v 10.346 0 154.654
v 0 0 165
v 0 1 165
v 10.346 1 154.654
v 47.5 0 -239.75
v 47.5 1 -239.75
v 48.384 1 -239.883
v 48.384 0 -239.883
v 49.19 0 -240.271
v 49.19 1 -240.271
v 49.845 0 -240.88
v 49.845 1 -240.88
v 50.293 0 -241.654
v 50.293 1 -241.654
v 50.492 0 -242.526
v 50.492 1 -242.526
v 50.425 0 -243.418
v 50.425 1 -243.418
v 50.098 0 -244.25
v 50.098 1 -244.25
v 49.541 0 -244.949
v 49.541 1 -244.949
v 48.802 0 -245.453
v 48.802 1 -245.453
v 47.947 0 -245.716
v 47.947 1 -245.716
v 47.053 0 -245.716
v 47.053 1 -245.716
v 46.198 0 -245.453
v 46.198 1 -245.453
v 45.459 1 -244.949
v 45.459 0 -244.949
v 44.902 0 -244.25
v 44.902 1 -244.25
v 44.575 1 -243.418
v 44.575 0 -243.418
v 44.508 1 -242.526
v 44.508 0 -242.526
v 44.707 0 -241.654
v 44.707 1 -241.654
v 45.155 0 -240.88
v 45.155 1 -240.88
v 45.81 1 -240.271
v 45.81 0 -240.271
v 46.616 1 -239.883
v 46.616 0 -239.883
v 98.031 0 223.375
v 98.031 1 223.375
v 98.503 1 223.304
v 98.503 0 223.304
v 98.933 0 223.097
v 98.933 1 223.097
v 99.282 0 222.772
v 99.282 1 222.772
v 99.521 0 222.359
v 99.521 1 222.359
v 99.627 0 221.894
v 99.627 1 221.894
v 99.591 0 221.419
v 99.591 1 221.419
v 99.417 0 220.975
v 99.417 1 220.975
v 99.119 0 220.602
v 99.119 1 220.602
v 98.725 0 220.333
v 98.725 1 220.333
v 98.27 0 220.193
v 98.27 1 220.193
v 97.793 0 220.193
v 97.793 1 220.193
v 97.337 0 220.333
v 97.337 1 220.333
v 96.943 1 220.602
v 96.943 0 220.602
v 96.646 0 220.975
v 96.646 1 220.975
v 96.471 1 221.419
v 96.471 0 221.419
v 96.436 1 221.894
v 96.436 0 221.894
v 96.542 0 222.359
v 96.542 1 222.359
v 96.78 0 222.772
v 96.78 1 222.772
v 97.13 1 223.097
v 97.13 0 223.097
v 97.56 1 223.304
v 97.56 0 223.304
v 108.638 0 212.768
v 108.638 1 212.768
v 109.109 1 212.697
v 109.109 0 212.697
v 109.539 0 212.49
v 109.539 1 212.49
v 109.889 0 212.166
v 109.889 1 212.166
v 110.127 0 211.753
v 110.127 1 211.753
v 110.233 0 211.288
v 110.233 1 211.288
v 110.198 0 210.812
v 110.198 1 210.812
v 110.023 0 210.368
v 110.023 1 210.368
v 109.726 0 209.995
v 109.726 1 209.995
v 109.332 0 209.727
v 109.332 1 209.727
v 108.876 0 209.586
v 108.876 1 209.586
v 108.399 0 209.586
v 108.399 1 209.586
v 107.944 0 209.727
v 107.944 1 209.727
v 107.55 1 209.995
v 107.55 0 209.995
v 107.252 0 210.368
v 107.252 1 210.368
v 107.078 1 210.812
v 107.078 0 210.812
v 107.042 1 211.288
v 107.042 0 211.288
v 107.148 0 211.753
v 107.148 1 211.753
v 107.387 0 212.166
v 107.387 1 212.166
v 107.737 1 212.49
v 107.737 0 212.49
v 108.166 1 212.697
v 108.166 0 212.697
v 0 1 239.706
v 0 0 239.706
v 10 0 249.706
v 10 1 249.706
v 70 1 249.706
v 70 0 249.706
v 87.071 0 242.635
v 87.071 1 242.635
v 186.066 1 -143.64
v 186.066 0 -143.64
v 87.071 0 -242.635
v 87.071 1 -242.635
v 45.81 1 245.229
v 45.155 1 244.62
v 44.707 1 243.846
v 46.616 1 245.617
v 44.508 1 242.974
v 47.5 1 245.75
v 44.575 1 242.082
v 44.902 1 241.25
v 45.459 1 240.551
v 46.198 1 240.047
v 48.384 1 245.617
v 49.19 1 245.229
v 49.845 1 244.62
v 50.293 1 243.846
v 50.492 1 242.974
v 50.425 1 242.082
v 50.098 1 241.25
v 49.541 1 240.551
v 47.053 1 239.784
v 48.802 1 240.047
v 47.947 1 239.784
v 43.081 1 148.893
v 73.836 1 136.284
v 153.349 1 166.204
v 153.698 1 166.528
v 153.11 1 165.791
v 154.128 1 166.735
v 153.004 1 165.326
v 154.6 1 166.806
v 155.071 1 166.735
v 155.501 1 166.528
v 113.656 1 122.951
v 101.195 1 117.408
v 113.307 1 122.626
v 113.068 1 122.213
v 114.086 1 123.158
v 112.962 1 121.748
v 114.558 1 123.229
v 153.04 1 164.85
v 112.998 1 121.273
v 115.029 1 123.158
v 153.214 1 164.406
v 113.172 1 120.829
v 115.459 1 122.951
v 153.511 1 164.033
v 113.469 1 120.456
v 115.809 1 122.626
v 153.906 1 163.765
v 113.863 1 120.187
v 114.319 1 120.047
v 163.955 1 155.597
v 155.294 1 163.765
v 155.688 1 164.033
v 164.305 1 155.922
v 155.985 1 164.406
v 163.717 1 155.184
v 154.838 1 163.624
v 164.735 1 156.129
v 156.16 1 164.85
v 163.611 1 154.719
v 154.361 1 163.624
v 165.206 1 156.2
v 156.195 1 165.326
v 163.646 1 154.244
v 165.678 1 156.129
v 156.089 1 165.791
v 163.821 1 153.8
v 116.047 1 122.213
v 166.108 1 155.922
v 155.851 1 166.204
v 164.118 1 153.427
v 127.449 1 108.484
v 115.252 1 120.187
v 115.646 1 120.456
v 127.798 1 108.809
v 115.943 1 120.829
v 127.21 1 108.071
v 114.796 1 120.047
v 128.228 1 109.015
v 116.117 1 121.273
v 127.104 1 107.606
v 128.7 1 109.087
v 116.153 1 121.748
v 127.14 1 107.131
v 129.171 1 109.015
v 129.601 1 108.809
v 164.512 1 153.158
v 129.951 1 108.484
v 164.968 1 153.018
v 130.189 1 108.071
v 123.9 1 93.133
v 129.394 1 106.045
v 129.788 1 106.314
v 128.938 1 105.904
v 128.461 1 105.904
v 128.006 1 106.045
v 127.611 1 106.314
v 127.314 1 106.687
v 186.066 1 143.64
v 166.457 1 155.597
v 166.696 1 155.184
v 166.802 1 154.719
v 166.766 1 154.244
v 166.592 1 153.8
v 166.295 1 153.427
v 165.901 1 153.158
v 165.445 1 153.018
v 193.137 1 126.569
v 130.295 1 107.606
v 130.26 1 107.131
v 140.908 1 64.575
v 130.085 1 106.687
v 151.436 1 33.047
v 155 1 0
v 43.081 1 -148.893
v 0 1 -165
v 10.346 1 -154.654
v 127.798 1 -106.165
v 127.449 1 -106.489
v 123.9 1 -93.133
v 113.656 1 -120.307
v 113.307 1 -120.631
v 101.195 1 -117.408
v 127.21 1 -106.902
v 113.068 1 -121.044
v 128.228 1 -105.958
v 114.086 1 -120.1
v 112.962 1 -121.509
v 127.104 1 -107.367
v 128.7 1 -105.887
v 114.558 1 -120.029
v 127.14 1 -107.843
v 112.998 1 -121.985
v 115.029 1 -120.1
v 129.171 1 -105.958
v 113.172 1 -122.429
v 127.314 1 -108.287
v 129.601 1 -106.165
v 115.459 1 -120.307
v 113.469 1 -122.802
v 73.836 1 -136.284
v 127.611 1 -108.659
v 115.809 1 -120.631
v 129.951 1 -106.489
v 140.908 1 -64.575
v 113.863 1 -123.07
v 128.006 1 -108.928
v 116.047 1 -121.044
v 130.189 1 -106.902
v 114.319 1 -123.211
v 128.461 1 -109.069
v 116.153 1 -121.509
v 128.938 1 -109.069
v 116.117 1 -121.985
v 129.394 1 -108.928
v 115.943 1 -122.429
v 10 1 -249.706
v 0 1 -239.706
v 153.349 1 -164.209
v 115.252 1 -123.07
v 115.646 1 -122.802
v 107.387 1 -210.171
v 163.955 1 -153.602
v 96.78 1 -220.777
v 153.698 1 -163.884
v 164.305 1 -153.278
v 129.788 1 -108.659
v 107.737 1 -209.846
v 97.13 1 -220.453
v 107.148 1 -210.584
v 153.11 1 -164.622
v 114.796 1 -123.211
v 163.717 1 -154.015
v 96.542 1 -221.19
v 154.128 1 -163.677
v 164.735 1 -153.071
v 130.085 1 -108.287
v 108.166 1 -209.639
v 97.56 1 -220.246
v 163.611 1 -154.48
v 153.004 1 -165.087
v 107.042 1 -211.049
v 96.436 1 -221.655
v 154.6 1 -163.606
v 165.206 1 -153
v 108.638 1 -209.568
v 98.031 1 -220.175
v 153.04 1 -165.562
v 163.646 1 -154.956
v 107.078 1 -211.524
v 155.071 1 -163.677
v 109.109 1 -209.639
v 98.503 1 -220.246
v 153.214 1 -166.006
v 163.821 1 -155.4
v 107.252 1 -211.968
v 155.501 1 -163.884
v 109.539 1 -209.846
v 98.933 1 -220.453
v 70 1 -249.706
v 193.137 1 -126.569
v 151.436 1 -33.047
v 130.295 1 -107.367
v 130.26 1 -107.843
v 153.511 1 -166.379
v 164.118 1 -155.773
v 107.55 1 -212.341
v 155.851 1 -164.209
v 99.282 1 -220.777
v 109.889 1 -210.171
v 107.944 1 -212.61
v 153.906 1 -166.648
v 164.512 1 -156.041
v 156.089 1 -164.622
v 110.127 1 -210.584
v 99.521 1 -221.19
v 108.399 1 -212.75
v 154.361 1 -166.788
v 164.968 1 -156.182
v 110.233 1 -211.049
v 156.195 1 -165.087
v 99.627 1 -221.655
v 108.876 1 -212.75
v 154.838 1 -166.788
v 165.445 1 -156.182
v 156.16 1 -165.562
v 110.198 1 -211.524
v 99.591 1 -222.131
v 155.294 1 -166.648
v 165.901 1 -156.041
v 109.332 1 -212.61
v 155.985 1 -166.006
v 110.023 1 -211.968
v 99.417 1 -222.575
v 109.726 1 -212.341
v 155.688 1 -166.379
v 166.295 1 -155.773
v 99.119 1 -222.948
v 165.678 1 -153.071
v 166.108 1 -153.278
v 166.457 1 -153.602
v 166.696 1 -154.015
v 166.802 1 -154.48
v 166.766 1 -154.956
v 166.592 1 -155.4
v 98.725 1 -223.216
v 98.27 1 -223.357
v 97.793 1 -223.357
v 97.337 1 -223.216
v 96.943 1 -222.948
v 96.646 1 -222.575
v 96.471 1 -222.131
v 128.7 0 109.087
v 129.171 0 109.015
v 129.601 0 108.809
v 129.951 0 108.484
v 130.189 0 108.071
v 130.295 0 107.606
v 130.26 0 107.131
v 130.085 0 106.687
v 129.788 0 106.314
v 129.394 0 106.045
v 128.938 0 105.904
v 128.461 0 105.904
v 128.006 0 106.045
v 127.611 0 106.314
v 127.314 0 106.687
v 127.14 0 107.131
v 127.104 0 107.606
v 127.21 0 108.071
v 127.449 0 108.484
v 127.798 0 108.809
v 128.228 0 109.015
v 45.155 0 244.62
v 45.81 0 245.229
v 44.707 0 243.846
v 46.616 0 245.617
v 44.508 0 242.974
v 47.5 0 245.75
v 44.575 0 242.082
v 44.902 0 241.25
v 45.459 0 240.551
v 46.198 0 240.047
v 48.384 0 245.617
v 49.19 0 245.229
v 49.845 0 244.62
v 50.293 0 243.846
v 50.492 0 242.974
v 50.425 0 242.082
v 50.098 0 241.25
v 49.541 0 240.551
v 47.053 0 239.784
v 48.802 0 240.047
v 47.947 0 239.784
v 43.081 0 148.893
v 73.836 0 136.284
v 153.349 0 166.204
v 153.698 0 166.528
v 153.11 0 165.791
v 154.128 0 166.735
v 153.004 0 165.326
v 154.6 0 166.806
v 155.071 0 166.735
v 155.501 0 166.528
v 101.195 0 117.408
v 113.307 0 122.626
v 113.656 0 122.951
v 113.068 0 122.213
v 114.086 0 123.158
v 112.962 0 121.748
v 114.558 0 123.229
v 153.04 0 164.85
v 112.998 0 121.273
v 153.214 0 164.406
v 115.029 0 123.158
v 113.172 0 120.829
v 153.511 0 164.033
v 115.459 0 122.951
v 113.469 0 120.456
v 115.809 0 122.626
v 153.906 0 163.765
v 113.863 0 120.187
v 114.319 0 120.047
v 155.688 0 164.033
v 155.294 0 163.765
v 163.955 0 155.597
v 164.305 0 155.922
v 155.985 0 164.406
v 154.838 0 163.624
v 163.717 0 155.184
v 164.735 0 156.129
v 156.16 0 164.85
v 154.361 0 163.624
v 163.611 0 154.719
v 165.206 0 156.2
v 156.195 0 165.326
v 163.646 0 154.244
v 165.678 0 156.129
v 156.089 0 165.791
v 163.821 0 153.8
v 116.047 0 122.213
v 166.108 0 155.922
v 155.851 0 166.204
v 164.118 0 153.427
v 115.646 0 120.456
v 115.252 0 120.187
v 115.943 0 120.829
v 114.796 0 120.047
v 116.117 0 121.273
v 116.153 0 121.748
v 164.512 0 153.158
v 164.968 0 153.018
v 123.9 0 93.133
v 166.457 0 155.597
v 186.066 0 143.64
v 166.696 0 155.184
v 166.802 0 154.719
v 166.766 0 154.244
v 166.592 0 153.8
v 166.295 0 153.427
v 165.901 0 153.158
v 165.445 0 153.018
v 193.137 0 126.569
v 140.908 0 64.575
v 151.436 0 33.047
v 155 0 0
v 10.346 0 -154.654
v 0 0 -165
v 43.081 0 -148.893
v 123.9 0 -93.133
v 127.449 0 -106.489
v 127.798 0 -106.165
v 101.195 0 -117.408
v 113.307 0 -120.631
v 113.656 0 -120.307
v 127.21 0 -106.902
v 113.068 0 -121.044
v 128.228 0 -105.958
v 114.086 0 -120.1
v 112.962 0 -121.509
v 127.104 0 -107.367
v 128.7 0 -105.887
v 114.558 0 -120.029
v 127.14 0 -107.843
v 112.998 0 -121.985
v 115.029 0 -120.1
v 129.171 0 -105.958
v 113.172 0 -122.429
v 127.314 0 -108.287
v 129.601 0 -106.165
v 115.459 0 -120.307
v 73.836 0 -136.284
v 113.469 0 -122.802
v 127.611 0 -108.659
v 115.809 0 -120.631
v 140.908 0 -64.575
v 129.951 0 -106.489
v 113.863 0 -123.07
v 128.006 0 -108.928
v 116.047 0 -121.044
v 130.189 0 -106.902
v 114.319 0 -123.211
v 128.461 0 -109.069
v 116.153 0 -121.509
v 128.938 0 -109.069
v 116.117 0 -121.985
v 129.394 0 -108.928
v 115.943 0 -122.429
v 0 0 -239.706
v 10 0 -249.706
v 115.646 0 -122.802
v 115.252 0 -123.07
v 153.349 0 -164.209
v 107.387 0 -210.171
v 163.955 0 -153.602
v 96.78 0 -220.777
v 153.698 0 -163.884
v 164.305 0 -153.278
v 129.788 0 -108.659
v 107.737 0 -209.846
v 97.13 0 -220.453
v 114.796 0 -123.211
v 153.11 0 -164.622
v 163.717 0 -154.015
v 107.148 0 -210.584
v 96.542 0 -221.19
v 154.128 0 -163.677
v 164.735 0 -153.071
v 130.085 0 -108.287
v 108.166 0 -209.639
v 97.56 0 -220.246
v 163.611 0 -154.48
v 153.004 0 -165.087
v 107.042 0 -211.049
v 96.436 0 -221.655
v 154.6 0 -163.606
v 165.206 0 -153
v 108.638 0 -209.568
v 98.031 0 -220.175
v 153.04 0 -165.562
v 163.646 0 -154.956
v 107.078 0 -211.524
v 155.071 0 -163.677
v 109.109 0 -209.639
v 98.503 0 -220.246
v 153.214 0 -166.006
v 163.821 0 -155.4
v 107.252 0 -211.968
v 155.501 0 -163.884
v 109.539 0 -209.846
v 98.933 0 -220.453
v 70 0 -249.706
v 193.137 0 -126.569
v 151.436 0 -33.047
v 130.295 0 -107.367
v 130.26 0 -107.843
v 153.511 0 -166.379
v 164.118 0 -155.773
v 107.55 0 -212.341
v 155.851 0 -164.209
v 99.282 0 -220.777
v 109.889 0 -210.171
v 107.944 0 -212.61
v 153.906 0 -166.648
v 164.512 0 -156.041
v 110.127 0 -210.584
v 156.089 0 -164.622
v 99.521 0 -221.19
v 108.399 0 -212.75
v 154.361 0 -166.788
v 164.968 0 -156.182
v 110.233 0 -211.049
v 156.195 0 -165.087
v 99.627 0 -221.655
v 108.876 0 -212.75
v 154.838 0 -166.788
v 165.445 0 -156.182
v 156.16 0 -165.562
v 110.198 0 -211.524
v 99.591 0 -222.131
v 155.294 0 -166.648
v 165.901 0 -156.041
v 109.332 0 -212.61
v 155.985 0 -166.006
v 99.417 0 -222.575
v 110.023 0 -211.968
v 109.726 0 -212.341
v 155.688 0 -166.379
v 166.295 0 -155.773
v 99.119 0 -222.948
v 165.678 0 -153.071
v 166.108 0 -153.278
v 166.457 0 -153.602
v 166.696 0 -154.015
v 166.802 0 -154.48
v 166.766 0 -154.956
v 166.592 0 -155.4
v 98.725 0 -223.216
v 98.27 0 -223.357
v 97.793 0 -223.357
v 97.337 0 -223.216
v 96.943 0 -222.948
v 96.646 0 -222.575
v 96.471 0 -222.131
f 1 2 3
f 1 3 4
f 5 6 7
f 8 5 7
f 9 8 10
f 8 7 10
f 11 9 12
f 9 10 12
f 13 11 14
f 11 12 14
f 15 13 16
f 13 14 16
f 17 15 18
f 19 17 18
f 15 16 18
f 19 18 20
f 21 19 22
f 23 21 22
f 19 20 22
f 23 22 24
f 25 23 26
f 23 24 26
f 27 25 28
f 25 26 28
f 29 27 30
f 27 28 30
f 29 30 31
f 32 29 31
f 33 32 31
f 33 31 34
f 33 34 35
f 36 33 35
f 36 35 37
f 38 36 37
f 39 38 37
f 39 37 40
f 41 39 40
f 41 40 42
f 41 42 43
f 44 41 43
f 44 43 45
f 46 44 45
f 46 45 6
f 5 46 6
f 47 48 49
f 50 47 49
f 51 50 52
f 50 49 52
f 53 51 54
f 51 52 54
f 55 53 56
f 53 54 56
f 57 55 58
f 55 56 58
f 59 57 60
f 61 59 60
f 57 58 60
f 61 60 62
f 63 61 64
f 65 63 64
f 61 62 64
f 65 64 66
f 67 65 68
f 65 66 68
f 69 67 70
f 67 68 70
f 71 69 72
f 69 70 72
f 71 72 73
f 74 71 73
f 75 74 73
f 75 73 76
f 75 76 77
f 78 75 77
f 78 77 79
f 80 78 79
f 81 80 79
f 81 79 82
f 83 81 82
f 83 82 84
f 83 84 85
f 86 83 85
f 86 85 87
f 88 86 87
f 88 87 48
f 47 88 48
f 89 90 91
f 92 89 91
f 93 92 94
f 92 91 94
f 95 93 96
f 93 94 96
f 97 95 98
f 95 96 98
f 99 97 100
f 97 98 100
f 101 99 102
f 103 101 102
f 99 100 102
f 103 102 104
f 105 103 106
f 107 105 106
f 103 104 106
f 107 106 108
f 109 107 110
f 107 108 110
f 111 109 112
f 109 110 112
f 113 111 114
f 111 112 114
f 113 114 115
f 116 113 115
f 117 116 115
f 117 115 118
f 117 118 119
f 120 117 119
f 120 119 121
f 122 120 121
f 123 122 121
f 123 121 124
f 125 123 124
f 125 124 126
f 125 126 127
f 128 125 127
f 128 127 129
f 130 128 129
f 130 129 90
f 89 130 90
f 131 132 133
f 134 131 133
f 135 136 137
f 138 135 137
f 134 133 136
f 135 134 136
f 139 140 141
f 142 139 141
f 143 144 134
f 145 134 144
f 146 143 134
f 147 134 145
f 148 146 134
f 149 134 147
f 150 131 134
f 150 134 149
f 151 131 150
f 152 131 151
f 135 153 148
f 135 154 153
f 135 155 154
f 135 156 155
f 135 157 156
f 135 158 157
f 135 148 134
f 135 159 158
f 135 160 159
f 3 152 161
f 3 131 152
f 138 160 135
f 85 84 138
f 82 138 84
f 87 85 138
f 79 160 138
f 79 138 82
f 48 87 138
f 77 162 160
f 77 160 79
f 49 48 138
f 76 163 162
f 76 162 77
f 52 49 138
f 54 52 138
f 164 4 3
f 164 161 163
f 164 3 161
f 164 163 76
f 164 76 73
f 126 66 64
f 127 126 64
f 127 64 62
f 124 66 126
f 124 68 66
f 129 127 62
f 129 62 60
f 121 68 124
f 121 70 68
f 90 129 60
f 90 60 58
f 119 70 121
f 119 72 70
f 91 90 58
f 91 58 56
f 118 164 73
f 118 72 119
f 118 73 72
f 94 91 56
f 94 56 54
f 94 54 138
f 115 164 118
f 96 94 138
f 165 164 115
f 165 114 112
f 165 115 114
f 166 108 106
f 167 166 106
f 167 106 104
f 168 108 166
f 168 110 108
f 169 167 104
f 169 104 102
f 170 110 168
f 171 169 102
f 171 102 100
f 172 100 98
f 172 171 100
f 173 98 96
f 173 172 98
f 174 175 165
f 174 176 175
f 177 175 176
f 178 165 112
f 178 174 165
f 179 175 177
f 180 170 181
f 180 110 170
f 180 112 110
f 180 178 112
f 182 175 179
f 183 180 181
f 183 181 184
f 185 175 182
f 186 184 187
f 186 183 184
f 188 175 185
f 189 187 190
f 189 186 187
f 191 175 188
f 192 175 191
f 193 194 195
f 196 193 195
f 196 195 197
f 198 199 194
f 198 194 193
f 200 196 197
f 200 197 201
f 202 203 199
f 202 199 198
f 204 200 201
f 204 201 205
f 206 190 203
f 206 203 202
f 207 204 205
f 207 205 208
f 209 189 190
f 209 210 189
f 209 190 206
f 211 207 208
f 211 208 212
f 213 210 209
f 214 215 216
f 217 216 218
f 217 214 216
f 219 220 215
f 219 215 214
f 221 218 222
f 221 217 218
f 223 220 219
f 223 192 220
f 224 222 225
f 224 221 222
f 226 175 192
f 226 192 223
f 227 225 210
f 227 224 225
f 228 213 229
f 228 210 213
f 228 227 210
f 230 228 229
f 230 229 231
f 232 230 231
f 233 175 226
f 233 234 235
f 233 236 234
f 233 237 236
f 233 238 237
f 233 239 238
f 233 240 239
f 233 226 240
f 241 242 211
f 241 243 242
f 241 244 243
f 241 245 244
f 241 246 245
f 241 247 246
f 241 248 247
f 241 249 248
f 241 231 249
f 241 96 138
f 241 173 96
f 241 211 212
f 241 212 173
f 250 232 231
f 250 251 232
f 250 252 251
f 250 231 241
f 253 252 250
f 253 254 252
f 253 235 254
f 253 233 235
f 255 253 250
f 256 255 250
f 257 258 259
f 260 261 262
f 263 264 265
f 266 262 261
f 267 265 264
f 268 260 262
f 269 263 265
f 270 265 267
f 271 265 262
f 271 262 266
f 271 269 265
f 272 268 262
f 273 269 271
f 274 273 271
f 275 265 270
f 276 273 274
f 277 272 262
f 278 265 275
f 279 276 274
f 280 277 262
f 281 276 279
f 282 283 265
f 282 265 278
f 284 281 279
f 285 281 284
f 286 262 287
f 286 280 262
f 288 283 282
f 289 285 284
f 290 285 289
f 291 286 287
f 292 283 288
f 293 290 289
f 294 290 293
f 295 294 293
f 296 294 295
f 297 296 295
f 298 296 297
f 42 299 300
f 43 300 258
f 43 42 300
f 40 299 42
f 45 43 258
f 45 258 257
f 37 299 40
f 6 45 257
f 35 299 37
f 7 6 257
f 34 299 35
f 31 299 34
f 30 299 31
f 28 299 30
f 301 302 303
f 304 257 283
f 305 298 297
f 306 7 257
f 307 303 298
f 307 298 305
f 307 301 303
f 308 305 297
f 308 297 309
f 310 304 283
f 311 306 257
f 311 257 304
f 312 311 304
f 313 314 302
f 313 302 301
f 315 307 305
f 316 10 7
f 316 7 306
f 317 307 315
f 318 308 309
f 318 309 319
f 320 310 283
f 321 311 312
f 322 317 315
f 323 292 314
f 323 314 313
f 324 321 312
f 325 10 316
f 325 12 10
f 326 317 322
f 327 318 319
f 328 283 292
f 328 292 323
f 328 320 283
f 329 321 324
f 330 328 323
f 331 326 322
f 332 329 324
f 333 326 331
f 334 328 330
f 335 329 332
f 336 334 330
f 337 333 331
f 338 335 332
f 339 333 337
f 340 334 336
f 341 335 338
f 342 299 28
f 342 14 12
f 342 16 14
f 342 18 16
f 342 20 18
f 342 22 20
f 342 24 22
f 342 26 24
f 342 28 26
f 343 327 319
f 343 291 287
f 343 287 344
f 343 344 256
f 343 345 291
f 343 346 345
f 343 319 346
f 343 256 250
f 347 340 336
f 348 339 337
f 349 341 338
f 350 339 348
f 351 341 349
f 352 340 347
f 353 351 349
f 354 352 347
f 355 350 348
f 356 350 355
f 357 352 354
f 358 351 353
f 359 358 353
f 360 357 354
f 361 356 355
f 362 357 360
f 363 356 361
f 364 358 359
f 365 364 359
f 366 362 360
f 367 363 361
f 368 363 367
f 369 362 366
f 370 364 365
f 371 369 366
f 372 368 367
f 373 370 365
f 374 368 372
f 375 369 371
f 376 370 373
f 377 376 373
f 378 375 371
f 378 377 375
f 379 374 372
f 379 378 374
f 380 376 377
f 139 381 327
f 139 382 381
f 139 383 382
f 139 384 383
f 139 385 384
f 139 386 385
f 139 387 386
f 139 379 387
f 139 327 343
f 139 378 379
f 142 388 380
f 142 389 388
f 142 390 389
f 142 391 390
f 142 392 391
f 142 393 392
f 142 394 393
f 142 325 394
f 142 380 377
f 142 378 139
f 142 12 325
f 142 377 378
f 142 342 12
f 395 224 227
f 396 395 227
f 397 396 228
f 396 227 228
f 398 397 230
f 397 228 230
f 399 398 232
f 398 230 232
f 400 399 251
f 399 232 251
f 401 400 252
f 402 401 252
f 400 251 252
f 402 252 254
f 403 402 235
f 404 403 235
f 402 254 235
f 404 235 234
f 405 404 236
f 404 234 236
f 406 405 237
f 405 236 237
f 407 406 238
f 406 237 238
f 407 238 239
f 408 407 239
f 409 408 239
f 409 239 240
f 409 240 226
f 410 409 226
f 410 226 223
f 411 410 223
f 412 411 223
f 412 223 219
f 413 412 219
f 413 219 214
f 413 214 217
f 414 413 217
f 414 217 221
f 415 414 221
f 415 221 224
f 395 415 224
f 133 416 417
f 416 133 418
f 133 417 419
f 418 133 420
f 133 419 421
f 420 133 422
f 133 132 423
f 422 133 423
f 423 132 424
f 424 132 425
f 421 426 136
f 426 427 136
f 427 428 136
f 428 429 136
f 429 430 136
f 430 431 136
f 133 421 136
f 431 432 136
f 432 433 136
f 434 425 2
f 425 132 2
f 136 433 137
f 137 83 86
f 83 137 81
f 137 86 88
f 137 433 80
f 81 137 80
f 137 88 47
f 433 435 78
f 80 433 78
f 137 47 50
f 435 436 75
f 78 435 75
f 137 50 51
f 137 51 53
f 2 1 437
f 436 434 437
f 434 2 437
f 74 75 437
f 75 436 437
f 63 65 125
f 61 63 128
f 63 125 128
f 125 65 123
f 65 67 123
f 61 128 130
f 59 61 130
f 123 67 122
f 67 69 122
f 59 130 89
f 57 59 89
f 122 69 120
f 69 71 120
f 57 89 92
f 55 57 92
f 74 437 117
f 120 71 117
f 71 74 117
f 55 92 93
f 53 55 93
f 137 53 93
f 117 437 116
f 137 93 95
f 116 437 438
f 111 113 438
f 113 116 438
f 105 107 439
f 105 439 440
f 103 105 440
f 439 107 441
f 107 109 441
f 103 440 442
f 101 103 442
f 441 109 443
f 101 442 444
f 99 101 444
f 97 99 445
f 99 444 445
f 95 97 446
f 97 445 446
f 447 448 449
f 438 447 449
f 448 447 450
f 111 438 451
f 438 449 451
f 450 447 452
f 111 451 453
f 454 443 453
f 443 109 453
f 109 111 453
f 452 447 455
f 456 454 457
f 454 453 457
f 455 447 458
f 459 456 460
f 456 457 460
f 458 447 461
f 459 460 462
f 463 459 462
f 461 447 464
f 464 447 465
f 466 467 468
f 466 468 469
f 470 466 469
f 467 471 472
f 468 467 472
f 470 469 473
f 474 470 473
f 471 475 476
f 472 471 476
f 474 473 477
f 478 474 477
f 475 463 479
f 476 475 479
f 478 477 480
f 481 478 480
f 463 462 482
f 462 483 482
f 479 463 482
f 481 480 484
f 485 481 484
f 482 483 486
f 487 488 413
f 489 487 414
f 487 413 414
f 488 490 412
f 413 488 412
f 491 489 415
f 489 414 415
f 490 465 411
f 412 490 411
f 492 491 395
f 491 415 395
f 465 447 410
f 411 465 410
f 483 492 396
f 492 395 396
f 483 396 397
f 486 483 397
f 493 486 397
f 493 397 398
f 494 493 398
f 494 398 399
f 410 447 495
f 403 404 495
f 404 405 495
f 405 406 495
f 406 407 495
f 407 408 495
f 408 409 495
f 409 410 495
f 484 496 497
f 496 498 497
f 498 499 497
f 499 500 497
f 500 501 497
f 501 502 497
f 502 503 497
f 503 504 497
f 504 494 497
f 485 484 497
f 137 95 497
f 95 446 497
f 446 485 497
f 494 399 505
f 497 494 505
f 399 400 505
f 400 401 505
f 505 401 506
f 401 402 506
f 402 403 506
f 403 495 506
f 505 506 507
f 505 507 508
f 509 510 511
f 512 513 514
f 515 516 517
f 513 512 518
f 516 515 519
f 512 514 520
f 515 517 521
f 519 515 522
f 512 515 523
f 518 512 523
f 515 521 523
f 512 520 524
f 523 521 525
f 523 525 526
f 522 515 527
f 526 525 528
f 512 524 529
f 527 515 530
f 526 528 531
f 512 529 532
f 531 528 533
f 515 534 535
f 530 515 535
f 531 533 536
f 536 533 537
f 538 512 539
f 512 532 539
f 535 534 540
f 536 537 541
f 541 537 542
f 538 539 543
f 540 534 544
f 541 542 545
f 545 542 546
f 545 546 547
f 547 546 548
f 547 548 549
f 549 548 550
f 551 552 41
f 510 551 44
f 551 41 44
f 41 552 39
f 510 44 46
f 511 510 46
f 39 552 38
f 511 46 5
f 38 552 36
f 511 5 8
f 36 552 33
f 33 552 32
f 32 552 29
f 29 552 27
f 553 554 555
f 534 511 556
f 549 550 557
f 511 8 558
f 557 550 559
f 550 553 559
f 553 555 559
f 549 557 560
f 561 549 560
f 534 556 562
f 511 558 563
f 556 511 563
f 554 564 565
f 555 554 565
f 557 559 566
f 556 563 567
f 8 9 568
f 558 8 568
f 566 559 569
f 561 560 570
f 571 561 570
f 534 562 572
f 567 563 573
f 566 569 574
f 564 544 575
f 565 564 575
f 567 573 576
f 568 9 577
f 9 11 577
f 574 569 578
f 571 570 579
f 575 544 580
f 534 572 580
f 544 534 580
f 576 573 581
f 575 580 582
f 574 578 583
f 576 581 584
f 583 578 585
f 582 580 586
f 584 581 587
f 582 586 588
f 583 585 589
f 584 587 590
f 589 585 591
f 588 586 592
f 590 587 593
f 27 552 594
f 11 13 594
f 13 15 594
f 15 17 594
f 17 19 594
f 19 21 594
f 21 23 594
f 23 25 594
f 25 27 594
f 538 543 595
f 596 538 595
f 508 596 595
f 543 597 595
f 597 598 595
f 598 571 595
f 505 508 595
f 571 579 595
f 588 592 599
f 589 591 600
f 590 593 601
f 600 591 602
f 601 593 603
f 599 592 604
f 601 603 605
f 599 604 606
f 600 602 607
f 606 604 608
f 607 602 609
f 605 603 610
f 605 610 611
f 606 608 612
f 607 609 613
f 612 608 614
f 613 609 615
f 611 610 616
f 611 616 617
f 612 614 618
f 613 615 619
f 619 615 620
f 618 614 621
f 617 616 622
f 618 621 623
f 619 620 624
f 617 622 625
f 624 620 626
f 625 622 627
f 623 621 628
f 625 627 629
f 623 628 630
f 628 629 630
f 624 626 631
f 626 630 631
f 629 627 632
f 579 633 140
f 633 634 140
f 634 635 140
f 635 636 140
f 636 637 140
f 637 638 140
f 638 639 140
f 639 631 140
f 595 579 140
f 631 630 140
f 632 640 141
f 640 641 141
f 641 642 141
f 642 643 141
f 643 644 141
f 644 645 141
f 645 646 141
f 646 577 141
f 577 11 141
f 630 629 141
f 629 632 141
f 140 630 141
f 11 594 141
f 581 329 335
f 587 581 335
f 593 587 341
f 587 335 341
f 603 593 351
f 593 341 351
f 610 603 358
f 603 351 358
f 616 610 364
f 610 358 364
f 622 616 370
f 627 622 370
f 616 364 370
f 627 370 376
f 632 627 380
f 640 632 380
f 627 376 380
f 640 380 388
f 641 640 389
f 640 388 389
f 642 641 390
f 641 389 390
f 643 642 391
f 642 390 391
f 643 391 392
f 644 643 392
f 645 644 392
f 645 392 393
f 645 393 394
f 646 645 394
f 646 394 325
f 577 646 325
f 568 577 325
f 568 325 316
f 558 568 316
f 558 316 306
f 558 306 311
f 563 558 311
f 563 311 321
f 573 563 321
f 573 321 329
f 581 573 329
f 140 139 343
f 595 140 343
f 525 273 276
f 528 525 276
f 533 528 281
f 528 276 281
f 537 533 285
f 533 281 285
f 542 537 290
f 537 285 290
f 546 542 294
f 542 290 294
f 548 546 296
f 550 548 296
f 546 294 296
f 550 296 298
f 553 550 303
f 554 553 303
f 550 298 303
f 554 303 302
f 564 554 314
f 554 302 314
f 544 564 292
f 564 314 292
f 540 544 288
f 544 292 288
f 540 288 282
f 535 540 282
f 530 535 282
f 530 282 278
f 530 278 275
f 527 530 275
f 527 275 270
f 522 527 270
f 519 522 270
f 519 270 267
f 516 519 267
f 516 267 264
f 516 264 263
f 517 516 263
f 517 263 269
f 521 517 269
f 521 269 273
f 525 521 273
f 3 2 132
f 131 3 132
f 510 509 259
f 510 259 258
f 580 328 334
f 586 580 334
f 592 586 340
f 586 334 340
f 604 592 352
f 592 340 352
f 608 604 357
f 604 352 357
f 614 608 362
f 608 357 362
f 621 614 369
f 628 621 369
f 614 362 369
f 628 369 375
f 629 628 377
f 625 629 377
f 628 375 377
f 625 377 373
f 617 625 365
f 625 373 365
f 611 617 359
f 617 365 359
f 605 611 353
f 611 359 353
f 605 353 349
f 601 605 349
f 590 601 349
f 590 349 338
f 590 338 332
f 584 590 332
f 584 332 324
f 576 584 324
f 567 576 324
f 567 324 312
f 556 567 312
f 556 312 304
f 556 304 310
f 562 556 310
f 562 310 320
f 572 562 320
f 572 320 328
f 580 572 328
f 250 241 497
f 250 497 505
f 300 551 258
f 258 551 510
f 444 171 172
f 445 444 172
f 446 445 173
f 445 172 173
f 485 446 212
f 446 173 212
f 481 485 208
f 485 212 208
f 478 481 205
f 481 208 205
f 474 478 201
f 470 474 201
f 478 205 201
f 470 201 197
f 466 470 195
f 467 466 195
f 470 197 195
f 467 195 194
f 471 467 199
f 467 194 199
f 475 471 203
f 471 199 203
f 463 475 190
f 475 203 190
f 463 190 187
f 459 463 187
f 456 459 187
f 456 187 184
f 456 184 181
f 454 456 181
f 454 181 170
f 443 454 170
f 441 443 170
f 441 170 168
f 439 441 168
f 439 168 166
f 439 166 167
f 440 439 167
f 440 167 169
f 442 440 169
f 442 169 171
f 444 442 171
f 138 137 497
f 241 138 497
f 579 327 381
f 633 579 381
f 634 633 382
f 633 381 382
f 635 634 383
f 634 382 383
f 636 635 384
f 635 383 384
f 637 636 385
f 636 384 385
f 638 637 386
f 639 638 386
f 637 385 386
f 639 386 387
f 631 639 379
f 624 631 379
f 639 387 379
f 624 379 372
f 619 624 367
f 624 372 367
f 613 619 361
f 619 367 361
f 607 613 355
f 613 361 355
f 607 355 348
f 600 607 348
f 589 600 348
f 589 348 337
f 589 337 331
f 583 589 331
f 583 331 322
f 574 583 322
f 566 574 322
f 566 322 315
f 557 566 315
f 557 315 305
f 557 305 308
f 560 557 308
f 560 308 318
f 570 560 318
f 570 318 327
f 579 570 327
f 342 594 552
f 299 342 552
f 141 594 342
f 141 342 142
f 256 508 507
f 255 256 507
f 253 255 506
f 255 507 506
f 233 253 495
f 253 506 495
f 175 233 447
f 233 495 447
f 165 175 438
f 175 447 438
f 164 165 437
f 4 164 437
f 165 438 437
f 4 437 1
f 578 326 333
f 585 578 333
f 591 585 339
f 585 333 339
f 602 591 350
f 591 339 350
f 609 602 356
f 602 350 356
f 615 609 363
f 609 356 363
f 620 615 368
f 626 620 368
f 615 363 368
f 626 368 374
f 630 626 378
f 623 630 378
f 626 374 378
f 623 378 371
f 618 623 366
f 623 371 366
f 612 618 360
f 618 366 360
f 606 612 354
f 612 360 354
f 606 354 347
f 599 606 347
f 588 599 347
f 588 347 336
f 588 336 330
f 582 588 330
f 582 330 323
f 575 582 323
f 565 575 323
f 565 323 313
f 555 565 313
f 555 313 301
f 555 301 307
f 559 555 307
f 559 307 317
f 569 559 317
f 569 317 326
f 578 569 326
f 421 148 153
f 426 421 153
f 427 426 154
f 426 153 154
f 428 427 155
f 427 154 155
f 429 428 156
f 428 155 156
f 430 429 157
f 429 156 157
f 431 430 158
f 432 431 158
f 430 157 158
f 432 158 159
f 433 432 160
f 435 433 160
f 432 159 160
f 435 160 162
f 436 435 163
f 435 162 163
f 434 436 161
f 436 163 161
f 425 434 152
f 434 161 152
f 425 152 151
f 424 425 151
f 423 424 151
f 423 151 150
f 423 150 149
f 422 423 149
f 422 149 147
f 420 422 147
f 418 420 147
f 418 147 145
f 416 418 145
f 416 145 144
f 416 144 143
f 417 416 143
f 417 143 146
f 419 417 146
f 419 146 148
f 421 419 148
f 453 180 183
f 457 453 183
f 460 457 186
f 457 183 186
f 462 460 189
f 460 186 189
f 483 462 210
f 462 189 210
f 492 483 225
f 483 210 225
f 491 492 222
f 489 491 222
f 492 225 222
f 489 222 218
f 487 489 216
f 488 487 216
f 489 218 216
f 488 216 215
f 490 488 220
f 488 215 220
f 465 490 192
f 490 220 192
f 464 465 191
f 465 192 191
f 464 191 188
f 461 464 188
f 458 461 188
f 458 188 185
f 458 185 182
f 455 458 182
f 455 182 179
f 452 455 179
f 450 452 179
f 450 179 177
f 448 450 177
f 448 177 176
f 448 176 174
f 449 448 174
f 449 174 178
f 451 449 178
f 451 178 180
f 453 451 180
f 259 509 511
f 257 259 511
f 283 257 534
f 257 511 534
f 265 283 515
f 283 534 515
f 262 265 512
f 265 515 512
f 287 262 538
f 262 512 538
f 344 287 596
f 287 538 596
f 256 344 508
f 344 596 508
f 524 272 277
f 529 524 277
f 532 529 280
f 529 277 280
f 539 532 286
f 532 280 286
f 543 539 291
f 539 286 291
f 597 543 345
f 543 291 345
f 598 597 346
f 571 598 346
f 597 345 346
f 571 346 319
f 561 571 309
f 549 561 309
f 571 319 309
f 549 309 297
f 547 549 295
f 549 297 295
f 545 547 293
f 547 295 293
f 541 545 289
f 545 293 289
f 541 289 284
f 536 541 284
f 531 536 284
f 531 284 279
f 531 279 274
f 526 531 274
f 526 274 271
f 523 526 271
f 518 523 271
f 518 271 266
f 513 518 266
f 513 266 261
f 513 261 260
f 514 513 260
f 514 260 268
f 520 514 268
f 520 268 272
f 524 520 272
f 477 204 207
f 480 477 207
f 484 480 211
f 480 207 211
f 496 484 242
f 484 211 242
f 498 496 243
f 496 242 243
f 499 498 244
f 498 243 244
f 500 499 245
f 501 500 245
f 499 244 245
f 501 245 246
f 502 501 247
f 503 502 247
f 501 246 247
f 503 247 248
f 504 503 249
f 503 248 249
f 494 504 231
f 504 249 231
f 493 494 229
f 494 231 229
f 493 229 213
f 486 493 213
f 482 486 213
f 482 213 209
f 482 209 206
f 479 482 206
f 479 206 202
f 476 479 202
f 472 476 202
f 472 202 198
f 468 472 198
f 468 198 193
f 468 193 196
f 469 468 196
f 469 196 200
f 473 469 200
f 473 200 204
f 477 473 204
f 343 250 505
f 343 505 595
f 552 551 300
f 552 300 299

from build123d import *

# Parameters (mm, degrees)
EXTRUDE_1_DEPTH     = 1
SKETCH_4_W          = 56.568542495
SKETCH_4_H          = 273.13708499
CUT_EXTRUDE_3_DEPTH = 354.138500868
CHAMFER_1_SIZE      = 10
SKETCH_5_R          = 1.6
CUT_EXTRUDE_4_DEPTH = 10
SKETCH_6_R          = 3
CUT_EXTRUDE_5_DEPTH = 10
SKETCH_7_R          = 1.6
CUT_EXTRUDE_6_DEPTH = 4


with BuildPart() as part:
    # 草图1 → 凸台-拉伸1 (new body)
    with BuildSketch(Plane(origin=(0, 0, 0), x_dir=(1, 0, 0), z_dir=(0, 1, 0))):
        with BuildLine():
            Line((0, 249.705627485), (0, 155))
            ThreePointArc((0, 155), (109.601551084, 109.601551084), (155, 0))
            ThreePointArc((155, 0), (109.601551084, -109.601551084), (0, -155))
            Line((0, -155), (0, -249.705627485))
            Line((0, -249.705627485), (80, -249.705627485))
            Line((80, -249.705627485), (249.705627485, -80))
            Line((249.705627485, -80), (249.705627485, 0))
            Line((249.705627485, 0), (249.705627485, 80))
            Line((249.705627485, 80), (80, 249.705627485))
            Line((80, 249.705627485), (0, 249.705627485))
        make_face()
    extrude(amount=EXTRUDE_1_DEPTH)

    # 草图4 → 切除-拉伸3 (cut, through all)
    with BuildSketch(Plane(origin=(0, 1, 0), x_dir=(1, 0, 0), z_dir=(0, 1, 0))):
        with Locations((221.421356237, 0)):
            Rectangle(SKETCH_4_W, SKETCH_4_H)
    extrude(amount=-CUT_EXTRUDE_3_DEPTH, mode=Mode.SUBTRACT)

    # 倒角1
    # the kernel refuses this chamfer: 10 mm, written as the material it takes off along each edge
    with BuildSketch(Plane(origin=(0, -26.617651024, -155), x_dir=(0.9994423420060535, 0, 0.0333916906648138), z_dir=(0, 1, 0))) as chamfer_1_piece_1:
        with BuildLine():
            Line((10.351424106, 0), (-CHAMFER_1_SIZE * 0.0333916906648, CHAMFER_1_SIZE * 0.999442342006))
            Line((-CHAMFER_1_SIZE * 0.0333916906648, CHAMFER_1_SIZE * 0.999442342006), (0, 0))
            ThreePointArc((0, 0), (5.321987279, 0.086367968), (10.351424106, 0))
        make_face()
    extrude(amount=54.235302047, mode=Mode.SUBTRACT)
    with BuildSketch(Plane(origin=(0, -25.71682988, -249.705627485), x_dir=(0, 0, 1), z_dir=(0, 1, 0))) as chamfer_1_piece_2:
        Polygon((CHAMFER_1_SIZE, 0), (0, CHAMFER_1_SIZE), (0, 0), align=None)
    extrude(amount=52.433659759, mode=Mode.SUBTRACT)
    with BuildSketch(Plane(origin=(80, -25.926703929, -249.705627485), x_dir=(-1, 0, 0), z_dir=(0, 1, 0)), Plane(origin=(193.13708499, 26.926703929, 136.568542495), x_dir=(-0.7071067811865447, 0, 0.7071067811865503), z_dir=(0, -1, 0))) as chamfer_1_piece_3:
        Polygon((CHAMFER_1_SIZE, 0), (-CHAMFER_1_SIZE * 0.707106781187, CHAMFER_1_SIZE * 0.707106781187), (0, 0), align=None)
    extrude(amount=52.853407858, mode=Mode.SUBTRACT)
    with BuildSketch(Plane(origin=(80, -25.926703929, 249.705627485), x_dir=(-1, 0, 0), z_dir=(0, 1, 0)), Plane(origin=(193.13708499, 26.926703929, -136.568542495), x_dir=(-0.7071067811865476, 0, -0.7071067811865476), z_dir=(0, -1, 0))) as chamfer_1_piece_4:
        Polygon((CHAMFER_1_SIZE, 0), (-CHAMFER_1_SIZE * 0.707106781187, -CHAMFER_1_SIZE * 0.707106781187), (0, 0), align=None)
    extrude(amount=52.853407858, mode=Mode.SUBTRACT)
    with BuildSketch(Plane(origin=(0, -25.71682988, 249.705627485), x_dir=(0, 0, -1), z_dir=(0, 1, 0))) as chamfer_1_piece_5:
        Polygon((CHAMFER_1_SIZE, 0), (0, -CHAMFER_1_SIZE), (0, 0), align=None)
    extrude(amount=52.433659759, mode=Mode.SUBTRACT)
    with BuildSketch(Plane(origin=(0, -26.617651024, 155), x_dir=(0, 0, 1), z_dir=(0, 1, 0))) as chamfer_1_piece_6:
        with BuildLine():
            Line((CHAMFER_1_SIZE, 0), (-0.345651552, 10.345651552))
            ThreePointArc((-0.345651552, 10.345651552), (-0.091390348, 5.321903403), (0, 0))
            Line((0, 0), (CHAMFER_1_SIZE, 0))
        make_face()
    extrude(amount=54.235302047, mode=Mode.SUBTRACT)

    # 草图5 → 切除-拉伸4 (cut)
    with BuildSketch(Plane(origin=(0, 1, 0), x_dir=(1, 0, 0), z_dir=(0, 1, 0))):
        with Locations(Location((98.03122292, -221.774909628, 0), (0, 0, 270))):
            Circle(SKETCH_5_R)
        with Locations(Location((108.637824638, -211.16830791, 0), (0, 0, 270))):
            Circle(SKETCH_5_R)
        with Locations(Location((154.599765415, -165.206367133, 0), (0, 0, 270))):
            Circle(SKETCH_5_R)
        with Locations(Location((165.206367133, -154.599765415, 0), (0, 0, 270))):
            Circle(SKETCH_5_R)
        with Locations(Location((165.206367133, 154.599765415, 0), (0, 0, 270))):
            Circle(SKETCH_5_R)
        with Locations(Location((154.599765415, 165.206367133, 0), (0, 0, 270))):
            Circle(SKETCH_5_R)
        with Locations(Location((108.637824638, 211.16830791, 0), (0, 0, 270))):
            Circle(SKETCH_5_R)
        with Locations(Location((98.03122292, 221.774909628, 0), (0, 0, 270))):
            Circle(SKETCH_5_R)
    extrude(amount=-CUT_EXTRUDE_4_DEPTH, mode=Mode.SUBTRACT)

    # 草图6 → 切除-拉伸5 (cut)
    with BuildSketch(Plane(origin=(0, 1, 0), x_dir=(1, 0, 0), z_dir=(0, 1, 0))):
        with Locations(Location((47.5, 242.75, 0), (0, 0, 270))):
            Circle(SKETCH_6_R)
        with Locations(Location((47.5, -242.75, 0), (0, 0, 270))):
            Circle(SKETCH_6_R)
    extrude(amount=-CUT_EXTRUDE_5_DEPTH, mode=Mode.SUBTRACT)

    # 草图7 → 切除-拉伸6 (cut)
    with BuildSketch(Plane(origin=(0, 1, 0), x_dir=(1, 0, 0), z_dir=(0, 1, 0))):
        with Locations(Location((114.557611845, 121.628679656, 0), (0, 0, 270))):
            Circle(SKETCH_7_R)
        with Locations(Location((128.699747468, 107.486544033, 0), (0, 0, 270))):
            Circle(SKETCH_7_R)
        with Locations(Location((128.699747468, -107.486544033, 0), (0, 0, 270))):
            Circle(SKETCH_7_R)
        with Locations(Location((114.557611845, -121.628679656, 0), (0, 0, 270))):
            Circle(SKETCH_7_R)
    extrude(amount=-CUT_EXTRUDE_6_DEPTH, mode=Mode.SUBTRACT)


solid = part.part
